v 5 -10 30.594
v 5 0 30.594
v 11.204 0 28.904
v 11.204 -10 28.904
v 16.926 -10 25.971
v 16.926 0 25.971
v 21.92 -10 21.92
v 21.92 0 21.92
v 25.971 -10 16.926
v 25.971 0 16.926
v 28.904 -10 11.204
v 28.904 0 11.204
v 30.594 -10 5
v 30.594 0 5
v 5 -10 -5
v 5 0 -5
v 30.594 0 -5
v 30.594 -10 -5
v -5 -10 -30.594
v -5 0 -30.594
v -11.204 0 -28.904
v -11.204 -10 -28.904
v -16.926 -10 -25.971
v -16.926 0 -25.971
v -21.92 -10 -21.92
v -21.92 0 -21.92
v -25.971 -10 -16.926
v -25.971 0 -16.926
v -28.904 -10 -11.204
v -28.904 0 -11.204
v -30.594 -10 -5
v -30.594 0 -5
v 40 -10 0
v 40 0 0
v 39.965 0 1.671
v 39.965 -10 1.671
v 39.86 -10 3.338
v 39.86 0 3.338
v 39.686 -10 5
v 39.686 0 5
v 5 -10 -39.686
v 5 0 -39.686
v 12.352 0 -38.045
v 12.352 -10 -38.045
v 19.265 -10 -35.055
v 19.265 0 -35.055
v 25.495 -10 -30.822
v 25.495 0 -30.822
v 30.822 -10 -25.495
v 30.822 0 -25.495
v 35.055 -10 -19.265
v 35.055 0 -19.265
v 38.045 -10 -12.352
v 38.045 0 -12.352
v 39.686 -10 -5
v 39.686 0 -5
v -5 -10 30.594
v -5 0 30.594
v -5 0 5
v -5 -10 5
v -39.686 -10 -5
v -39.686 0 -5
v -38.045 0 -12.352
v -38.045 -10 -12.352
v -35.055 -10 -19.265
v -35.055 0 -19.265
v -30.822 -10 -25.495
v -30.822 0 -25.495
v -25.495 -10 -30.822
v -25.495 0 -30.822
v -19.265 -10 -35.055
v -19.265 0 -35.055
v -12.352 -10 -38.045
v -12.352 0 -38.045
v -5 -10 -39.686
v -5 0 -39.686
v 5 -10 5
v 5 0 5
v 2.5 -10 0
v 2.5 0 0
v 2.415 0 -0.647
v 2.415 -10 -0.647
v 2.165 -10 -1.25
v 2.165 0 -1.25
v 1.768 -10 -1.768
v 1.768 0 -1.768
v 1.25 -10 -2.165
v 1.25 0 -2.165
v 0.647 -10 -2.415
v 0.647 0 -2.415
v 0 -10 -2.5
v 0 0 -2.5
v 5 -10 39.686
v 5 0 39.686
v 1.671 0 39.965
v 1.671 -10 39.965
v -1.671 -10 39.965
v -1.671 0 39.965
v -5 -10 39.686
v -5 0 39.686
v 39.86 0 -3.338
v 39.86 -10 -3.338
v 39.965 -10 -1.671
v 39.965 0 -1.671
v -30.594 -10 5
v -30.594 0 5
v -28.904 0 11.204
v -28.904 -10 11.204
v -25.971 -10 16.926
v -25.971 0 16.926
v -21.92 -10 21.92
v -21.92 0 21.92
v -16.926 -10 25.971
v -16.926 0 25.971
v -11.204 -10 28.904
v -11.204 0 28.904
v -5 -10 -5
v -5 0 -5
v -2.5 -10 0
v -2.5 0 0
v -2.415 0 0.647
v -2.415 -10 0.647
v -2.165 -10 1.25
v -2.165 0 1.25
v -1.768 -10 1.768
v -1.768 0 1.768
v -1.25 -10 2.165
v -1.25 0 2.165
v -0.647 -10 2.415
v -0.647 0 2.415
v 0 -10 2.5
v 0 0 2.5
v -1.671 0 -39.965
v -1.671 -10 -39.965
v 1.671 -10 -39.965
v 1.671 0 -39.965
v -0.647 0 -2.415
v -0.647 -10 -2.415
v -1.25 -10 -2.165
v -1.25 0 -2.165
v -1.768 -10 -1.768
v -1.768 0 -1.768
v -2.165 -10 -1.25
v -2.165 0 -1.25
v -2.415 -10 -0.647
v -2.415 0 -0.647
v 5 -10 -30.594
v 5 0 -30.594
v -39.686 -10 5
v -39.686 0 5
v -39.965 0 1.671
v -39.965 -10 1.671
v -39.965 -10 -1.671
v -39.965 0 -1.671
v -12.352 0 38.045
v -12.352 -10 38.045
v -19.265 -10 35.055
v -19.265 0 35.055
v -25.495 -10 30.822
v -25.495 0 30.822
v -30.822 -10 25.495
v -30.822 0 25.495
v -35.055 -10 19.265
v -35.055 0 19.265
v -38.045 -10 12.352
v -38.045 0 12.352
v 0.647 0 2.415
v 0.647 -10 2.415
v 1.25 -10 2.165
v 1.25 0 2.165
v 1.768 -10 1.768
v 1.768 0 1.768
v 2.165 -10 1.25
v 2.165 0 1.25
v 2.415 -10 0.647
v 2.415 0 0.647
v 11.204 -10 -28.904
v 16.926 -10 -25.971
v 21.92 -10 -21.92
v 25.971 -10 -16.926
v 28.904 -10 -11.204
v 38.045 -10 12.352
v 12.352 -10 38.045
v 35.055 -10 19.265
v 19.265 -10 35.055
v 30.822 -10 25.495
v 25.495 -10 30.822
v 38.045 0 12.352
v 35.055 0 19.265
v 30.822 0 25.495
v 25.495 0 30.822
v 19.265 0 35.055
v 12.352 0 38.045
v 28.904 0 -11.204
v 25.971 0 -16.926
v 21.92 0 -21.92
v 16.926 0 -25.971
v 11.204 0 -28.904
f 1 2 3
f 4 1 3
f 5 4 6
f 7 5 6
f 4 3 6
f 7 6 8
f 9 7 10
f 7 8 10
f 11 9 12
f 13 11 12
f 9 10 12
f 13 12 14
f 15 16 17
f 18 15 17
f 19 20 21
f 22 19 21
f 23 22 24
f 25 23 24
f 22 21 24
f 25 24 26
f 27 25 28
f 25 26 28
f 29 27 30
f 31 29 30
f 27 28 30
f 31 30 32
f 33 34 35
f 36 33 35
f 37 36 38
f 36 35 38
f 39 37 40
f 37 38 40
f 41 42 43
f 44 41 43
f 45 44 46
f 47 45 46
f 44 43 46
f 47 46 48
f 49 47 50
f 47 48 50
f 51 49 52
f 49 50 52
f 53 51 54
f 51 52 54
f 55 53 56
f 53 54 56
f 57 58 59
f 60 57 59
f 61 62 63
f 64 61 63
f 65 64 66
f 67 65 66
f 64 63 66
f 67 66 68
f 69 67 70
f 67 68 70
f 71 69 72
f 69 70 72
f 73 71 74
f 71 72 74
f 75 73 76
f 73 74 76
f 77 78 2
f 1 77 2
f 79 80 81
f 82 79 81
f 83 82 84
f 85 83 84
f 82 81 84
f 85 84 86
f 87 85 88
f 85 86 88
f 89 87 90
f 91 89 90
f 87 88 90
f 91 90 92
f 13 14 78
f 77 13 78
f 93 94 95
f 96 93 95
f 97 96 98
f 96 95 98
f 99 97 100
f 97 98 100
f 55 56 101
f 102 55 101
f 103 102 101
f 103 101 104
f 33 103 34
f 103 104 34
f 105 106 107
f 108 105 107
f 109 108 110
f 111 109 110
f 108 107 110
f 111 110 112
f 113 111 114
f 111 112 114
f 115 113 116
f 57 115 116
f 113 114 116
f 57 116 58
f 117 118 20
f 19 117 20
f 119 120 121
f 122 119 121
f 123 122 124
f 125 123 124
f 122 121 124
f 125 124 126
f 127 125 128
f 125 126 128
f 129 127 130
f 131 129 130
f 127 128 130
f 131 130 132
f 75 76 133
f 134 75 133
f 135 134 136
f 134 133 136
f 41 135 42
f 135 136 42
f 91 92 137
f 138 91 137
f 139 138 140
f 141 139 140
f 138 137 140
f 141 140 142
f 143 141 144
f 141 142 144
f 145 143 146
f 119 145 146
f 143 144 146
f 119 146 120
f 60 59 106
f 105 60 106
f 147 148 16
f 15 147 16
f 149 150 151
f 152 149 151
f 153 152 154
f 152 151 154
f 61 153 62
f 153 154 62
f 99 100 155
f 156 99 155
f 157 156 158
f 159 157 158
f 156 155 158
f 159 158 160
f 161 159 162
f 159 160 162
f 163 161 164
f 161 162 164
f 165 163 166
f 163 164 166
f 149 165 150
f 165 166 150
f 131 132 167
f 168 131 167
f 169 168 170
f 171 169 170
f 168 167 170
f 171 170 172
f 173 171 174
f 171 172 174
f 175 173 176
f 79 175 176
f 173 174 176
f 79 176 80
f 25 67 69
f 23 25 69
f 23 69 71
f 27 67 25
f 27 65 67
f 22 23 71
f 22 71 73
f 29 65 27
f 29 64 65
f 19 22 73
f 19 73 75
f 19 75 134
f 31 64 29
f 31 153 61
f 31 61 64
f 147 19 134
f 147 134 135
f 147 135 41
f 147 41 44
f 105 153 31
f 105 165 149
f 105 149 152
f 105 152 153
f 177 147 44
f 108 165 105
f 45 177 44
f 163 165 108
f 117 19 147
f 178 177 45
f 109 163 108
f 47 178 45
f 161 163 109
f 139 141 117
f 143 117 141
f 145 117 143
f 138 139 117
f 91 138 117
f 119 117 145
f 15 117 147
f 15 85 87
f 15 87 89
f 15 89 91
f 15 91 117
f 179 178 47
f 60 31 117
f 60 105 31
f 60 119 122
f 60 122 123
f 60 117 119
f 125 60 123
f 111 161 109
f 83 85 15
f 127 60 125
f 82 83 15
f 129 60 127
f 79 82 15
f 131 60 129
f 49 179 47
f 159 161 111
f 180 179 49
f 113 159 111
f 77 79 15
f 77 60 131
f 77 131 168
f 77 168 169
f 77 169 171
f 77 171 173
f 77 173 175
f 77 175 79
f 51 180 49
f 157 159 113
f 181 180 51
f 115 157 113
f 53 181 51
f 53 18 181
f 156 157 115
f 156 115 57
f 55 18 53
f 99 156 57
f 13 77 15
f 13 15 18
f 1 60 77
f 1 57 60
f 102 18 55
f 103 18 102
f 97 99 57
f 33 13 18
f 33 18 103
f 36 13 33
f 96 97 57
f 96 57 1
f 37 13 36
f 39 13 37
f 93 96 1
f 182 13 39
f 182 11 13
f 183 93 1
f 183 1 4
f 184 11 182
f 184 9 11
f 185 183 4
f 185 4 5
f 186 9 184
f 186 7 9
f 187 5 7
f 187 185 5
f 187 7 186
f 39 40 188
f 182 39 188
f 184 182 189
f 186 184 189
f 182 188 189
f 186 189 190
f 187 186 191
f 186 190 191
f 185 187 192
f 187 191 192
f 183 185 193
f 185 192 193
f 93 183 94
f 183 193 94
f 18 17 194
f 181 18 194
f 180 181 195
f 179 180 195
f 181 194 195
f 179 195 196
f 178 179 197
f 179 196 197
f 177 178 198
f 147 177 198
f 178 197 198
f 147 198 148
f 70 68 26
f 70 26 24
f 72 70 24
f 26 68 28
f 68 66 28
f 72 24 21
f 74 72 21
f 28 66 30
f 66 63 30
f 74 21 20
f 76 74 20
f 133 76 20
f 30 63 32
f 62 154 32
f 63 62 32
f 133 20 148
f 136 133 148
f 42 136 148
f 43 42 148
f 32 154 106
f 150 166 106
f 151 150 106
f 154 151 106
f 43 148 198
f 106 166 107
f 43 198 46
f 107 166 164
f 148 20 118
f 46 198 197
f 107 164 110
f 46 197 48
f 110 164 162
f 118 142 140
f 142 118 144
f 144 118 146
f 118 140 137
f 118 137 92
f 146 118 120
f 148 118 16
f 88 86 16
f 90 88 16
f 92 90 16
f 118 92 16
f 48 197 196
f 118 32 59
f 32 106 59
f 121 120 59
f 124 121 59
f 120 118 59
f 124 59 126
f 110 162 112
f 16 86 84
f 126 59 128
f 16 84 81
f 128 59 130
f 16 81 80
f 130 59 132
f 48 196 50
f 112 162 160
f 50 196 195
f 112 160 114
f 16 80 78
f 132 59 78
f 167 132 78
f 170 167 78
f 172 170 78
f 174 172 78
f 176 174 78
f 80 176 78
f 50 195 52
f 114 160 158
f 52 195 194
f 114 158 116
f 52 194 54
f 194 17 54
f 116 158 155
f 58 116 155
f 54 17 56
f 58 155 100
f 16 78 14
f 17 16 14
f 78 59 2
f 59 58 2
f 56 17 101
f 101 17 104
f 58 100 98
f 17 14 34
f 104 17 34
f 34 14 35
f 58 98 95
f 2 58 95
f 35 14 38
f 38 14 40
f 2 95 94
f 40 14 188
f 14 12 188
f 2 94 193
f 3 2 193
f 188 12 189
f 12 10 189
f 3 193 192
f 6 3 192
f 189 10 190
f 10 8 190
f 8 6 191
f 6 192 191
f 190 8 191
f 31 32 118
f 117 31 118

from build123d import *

# Parameters (mm, degrees)
F1_DEPTH = 10


with BuildPart() as f1:
    # F0 (on Front) → F1 (new body)
    with BuildSketch(Plane.XZ):
        with BuildLine():
            ThreePointArc((39.68627, -5), (39.92149, -2.504917), (40, 0))
            ThreePointArc((40, 0), (39.92149, 2.504917), (39.68627, 5))
            ThreePointArc((39.68627, 5), (28.284271, 28.284271), (5, 39.68627))
            ThreePointArc((5, 39.68627), (0, 40), (-5, 39.68627))
            ThreePointArc((-5, 39.68627), (-28.284271, 28.284271), (-39.68627, 5))
            ThreePointArc((-39.68627, 5), (-40, 0), (-39.68627, -5))
            ThreePointArc((-39.68627, -5), (-28.284271, -28.284271), (-5, -39.68627))
            ThreePointArc((-5, -39.68627), (0, -40), (5, -39.68627))
            ThreePointArc((5, -39.68627), (28.284271, -28.284271), (39.68627, -5))
        make_face()
        with BuildLine():
            ThreePointArc((-5, -30.594117), (-21.92031, -21.92031), (-30.594117, -5))
            Line((-30.594117, -5), (-5, -5))
            Line((-5, -5), (-5, -30.594117))
        make_face(mode=Mode.SUBTRACT)
        with BuildLine():
            Line((5, -30.594117), (5, -5))
            Line((5, -5), (30.594117, -5))
            ThreePointArc((30.594117, -5), (21.92031, -21.92031), (5, -30.594117))
        make_face(mode=Mode.SUBTRACT)
        with BuildLine():
            ThreePointArc((-30.594117, 5), (-21.92031, 21.92031), (-5, 30.594117))
            Line((-5, 30.594117), (-5, 5))
            Line((-5, 5), (-30.594117, 5))
        make_face(mode=Mode.SUBTRACT)
        with BuildLine():
            ThreePointArc((0, 2.5), (1.767767, 1.767767), (2.5, 0))
            ThreePointArc((2.5, 0), (1.767767, -1.767767), (0, -2.5))
            ThreePointArc((0, -2.5), (-1.767767, -1.767767), (-2.5, 0))
            ThreePointArc((-2.5, 0), (-1.767767, 1.767767), (0, 2.5))
        make_face(mode=Mode.SUBTRACT)
        with BuildLine():
            Line((30.594117, 5), (5, 5))
            Line((5, 5), (5, 30.594117))
            ThreePointArc((5, 30.594117), (21.92031, 21.92031), (30.594117, 5))
        make_face(mode=Mode.SUBTRACT)
    extrude(amount=F1_DEPTH)


solid = f1.part
